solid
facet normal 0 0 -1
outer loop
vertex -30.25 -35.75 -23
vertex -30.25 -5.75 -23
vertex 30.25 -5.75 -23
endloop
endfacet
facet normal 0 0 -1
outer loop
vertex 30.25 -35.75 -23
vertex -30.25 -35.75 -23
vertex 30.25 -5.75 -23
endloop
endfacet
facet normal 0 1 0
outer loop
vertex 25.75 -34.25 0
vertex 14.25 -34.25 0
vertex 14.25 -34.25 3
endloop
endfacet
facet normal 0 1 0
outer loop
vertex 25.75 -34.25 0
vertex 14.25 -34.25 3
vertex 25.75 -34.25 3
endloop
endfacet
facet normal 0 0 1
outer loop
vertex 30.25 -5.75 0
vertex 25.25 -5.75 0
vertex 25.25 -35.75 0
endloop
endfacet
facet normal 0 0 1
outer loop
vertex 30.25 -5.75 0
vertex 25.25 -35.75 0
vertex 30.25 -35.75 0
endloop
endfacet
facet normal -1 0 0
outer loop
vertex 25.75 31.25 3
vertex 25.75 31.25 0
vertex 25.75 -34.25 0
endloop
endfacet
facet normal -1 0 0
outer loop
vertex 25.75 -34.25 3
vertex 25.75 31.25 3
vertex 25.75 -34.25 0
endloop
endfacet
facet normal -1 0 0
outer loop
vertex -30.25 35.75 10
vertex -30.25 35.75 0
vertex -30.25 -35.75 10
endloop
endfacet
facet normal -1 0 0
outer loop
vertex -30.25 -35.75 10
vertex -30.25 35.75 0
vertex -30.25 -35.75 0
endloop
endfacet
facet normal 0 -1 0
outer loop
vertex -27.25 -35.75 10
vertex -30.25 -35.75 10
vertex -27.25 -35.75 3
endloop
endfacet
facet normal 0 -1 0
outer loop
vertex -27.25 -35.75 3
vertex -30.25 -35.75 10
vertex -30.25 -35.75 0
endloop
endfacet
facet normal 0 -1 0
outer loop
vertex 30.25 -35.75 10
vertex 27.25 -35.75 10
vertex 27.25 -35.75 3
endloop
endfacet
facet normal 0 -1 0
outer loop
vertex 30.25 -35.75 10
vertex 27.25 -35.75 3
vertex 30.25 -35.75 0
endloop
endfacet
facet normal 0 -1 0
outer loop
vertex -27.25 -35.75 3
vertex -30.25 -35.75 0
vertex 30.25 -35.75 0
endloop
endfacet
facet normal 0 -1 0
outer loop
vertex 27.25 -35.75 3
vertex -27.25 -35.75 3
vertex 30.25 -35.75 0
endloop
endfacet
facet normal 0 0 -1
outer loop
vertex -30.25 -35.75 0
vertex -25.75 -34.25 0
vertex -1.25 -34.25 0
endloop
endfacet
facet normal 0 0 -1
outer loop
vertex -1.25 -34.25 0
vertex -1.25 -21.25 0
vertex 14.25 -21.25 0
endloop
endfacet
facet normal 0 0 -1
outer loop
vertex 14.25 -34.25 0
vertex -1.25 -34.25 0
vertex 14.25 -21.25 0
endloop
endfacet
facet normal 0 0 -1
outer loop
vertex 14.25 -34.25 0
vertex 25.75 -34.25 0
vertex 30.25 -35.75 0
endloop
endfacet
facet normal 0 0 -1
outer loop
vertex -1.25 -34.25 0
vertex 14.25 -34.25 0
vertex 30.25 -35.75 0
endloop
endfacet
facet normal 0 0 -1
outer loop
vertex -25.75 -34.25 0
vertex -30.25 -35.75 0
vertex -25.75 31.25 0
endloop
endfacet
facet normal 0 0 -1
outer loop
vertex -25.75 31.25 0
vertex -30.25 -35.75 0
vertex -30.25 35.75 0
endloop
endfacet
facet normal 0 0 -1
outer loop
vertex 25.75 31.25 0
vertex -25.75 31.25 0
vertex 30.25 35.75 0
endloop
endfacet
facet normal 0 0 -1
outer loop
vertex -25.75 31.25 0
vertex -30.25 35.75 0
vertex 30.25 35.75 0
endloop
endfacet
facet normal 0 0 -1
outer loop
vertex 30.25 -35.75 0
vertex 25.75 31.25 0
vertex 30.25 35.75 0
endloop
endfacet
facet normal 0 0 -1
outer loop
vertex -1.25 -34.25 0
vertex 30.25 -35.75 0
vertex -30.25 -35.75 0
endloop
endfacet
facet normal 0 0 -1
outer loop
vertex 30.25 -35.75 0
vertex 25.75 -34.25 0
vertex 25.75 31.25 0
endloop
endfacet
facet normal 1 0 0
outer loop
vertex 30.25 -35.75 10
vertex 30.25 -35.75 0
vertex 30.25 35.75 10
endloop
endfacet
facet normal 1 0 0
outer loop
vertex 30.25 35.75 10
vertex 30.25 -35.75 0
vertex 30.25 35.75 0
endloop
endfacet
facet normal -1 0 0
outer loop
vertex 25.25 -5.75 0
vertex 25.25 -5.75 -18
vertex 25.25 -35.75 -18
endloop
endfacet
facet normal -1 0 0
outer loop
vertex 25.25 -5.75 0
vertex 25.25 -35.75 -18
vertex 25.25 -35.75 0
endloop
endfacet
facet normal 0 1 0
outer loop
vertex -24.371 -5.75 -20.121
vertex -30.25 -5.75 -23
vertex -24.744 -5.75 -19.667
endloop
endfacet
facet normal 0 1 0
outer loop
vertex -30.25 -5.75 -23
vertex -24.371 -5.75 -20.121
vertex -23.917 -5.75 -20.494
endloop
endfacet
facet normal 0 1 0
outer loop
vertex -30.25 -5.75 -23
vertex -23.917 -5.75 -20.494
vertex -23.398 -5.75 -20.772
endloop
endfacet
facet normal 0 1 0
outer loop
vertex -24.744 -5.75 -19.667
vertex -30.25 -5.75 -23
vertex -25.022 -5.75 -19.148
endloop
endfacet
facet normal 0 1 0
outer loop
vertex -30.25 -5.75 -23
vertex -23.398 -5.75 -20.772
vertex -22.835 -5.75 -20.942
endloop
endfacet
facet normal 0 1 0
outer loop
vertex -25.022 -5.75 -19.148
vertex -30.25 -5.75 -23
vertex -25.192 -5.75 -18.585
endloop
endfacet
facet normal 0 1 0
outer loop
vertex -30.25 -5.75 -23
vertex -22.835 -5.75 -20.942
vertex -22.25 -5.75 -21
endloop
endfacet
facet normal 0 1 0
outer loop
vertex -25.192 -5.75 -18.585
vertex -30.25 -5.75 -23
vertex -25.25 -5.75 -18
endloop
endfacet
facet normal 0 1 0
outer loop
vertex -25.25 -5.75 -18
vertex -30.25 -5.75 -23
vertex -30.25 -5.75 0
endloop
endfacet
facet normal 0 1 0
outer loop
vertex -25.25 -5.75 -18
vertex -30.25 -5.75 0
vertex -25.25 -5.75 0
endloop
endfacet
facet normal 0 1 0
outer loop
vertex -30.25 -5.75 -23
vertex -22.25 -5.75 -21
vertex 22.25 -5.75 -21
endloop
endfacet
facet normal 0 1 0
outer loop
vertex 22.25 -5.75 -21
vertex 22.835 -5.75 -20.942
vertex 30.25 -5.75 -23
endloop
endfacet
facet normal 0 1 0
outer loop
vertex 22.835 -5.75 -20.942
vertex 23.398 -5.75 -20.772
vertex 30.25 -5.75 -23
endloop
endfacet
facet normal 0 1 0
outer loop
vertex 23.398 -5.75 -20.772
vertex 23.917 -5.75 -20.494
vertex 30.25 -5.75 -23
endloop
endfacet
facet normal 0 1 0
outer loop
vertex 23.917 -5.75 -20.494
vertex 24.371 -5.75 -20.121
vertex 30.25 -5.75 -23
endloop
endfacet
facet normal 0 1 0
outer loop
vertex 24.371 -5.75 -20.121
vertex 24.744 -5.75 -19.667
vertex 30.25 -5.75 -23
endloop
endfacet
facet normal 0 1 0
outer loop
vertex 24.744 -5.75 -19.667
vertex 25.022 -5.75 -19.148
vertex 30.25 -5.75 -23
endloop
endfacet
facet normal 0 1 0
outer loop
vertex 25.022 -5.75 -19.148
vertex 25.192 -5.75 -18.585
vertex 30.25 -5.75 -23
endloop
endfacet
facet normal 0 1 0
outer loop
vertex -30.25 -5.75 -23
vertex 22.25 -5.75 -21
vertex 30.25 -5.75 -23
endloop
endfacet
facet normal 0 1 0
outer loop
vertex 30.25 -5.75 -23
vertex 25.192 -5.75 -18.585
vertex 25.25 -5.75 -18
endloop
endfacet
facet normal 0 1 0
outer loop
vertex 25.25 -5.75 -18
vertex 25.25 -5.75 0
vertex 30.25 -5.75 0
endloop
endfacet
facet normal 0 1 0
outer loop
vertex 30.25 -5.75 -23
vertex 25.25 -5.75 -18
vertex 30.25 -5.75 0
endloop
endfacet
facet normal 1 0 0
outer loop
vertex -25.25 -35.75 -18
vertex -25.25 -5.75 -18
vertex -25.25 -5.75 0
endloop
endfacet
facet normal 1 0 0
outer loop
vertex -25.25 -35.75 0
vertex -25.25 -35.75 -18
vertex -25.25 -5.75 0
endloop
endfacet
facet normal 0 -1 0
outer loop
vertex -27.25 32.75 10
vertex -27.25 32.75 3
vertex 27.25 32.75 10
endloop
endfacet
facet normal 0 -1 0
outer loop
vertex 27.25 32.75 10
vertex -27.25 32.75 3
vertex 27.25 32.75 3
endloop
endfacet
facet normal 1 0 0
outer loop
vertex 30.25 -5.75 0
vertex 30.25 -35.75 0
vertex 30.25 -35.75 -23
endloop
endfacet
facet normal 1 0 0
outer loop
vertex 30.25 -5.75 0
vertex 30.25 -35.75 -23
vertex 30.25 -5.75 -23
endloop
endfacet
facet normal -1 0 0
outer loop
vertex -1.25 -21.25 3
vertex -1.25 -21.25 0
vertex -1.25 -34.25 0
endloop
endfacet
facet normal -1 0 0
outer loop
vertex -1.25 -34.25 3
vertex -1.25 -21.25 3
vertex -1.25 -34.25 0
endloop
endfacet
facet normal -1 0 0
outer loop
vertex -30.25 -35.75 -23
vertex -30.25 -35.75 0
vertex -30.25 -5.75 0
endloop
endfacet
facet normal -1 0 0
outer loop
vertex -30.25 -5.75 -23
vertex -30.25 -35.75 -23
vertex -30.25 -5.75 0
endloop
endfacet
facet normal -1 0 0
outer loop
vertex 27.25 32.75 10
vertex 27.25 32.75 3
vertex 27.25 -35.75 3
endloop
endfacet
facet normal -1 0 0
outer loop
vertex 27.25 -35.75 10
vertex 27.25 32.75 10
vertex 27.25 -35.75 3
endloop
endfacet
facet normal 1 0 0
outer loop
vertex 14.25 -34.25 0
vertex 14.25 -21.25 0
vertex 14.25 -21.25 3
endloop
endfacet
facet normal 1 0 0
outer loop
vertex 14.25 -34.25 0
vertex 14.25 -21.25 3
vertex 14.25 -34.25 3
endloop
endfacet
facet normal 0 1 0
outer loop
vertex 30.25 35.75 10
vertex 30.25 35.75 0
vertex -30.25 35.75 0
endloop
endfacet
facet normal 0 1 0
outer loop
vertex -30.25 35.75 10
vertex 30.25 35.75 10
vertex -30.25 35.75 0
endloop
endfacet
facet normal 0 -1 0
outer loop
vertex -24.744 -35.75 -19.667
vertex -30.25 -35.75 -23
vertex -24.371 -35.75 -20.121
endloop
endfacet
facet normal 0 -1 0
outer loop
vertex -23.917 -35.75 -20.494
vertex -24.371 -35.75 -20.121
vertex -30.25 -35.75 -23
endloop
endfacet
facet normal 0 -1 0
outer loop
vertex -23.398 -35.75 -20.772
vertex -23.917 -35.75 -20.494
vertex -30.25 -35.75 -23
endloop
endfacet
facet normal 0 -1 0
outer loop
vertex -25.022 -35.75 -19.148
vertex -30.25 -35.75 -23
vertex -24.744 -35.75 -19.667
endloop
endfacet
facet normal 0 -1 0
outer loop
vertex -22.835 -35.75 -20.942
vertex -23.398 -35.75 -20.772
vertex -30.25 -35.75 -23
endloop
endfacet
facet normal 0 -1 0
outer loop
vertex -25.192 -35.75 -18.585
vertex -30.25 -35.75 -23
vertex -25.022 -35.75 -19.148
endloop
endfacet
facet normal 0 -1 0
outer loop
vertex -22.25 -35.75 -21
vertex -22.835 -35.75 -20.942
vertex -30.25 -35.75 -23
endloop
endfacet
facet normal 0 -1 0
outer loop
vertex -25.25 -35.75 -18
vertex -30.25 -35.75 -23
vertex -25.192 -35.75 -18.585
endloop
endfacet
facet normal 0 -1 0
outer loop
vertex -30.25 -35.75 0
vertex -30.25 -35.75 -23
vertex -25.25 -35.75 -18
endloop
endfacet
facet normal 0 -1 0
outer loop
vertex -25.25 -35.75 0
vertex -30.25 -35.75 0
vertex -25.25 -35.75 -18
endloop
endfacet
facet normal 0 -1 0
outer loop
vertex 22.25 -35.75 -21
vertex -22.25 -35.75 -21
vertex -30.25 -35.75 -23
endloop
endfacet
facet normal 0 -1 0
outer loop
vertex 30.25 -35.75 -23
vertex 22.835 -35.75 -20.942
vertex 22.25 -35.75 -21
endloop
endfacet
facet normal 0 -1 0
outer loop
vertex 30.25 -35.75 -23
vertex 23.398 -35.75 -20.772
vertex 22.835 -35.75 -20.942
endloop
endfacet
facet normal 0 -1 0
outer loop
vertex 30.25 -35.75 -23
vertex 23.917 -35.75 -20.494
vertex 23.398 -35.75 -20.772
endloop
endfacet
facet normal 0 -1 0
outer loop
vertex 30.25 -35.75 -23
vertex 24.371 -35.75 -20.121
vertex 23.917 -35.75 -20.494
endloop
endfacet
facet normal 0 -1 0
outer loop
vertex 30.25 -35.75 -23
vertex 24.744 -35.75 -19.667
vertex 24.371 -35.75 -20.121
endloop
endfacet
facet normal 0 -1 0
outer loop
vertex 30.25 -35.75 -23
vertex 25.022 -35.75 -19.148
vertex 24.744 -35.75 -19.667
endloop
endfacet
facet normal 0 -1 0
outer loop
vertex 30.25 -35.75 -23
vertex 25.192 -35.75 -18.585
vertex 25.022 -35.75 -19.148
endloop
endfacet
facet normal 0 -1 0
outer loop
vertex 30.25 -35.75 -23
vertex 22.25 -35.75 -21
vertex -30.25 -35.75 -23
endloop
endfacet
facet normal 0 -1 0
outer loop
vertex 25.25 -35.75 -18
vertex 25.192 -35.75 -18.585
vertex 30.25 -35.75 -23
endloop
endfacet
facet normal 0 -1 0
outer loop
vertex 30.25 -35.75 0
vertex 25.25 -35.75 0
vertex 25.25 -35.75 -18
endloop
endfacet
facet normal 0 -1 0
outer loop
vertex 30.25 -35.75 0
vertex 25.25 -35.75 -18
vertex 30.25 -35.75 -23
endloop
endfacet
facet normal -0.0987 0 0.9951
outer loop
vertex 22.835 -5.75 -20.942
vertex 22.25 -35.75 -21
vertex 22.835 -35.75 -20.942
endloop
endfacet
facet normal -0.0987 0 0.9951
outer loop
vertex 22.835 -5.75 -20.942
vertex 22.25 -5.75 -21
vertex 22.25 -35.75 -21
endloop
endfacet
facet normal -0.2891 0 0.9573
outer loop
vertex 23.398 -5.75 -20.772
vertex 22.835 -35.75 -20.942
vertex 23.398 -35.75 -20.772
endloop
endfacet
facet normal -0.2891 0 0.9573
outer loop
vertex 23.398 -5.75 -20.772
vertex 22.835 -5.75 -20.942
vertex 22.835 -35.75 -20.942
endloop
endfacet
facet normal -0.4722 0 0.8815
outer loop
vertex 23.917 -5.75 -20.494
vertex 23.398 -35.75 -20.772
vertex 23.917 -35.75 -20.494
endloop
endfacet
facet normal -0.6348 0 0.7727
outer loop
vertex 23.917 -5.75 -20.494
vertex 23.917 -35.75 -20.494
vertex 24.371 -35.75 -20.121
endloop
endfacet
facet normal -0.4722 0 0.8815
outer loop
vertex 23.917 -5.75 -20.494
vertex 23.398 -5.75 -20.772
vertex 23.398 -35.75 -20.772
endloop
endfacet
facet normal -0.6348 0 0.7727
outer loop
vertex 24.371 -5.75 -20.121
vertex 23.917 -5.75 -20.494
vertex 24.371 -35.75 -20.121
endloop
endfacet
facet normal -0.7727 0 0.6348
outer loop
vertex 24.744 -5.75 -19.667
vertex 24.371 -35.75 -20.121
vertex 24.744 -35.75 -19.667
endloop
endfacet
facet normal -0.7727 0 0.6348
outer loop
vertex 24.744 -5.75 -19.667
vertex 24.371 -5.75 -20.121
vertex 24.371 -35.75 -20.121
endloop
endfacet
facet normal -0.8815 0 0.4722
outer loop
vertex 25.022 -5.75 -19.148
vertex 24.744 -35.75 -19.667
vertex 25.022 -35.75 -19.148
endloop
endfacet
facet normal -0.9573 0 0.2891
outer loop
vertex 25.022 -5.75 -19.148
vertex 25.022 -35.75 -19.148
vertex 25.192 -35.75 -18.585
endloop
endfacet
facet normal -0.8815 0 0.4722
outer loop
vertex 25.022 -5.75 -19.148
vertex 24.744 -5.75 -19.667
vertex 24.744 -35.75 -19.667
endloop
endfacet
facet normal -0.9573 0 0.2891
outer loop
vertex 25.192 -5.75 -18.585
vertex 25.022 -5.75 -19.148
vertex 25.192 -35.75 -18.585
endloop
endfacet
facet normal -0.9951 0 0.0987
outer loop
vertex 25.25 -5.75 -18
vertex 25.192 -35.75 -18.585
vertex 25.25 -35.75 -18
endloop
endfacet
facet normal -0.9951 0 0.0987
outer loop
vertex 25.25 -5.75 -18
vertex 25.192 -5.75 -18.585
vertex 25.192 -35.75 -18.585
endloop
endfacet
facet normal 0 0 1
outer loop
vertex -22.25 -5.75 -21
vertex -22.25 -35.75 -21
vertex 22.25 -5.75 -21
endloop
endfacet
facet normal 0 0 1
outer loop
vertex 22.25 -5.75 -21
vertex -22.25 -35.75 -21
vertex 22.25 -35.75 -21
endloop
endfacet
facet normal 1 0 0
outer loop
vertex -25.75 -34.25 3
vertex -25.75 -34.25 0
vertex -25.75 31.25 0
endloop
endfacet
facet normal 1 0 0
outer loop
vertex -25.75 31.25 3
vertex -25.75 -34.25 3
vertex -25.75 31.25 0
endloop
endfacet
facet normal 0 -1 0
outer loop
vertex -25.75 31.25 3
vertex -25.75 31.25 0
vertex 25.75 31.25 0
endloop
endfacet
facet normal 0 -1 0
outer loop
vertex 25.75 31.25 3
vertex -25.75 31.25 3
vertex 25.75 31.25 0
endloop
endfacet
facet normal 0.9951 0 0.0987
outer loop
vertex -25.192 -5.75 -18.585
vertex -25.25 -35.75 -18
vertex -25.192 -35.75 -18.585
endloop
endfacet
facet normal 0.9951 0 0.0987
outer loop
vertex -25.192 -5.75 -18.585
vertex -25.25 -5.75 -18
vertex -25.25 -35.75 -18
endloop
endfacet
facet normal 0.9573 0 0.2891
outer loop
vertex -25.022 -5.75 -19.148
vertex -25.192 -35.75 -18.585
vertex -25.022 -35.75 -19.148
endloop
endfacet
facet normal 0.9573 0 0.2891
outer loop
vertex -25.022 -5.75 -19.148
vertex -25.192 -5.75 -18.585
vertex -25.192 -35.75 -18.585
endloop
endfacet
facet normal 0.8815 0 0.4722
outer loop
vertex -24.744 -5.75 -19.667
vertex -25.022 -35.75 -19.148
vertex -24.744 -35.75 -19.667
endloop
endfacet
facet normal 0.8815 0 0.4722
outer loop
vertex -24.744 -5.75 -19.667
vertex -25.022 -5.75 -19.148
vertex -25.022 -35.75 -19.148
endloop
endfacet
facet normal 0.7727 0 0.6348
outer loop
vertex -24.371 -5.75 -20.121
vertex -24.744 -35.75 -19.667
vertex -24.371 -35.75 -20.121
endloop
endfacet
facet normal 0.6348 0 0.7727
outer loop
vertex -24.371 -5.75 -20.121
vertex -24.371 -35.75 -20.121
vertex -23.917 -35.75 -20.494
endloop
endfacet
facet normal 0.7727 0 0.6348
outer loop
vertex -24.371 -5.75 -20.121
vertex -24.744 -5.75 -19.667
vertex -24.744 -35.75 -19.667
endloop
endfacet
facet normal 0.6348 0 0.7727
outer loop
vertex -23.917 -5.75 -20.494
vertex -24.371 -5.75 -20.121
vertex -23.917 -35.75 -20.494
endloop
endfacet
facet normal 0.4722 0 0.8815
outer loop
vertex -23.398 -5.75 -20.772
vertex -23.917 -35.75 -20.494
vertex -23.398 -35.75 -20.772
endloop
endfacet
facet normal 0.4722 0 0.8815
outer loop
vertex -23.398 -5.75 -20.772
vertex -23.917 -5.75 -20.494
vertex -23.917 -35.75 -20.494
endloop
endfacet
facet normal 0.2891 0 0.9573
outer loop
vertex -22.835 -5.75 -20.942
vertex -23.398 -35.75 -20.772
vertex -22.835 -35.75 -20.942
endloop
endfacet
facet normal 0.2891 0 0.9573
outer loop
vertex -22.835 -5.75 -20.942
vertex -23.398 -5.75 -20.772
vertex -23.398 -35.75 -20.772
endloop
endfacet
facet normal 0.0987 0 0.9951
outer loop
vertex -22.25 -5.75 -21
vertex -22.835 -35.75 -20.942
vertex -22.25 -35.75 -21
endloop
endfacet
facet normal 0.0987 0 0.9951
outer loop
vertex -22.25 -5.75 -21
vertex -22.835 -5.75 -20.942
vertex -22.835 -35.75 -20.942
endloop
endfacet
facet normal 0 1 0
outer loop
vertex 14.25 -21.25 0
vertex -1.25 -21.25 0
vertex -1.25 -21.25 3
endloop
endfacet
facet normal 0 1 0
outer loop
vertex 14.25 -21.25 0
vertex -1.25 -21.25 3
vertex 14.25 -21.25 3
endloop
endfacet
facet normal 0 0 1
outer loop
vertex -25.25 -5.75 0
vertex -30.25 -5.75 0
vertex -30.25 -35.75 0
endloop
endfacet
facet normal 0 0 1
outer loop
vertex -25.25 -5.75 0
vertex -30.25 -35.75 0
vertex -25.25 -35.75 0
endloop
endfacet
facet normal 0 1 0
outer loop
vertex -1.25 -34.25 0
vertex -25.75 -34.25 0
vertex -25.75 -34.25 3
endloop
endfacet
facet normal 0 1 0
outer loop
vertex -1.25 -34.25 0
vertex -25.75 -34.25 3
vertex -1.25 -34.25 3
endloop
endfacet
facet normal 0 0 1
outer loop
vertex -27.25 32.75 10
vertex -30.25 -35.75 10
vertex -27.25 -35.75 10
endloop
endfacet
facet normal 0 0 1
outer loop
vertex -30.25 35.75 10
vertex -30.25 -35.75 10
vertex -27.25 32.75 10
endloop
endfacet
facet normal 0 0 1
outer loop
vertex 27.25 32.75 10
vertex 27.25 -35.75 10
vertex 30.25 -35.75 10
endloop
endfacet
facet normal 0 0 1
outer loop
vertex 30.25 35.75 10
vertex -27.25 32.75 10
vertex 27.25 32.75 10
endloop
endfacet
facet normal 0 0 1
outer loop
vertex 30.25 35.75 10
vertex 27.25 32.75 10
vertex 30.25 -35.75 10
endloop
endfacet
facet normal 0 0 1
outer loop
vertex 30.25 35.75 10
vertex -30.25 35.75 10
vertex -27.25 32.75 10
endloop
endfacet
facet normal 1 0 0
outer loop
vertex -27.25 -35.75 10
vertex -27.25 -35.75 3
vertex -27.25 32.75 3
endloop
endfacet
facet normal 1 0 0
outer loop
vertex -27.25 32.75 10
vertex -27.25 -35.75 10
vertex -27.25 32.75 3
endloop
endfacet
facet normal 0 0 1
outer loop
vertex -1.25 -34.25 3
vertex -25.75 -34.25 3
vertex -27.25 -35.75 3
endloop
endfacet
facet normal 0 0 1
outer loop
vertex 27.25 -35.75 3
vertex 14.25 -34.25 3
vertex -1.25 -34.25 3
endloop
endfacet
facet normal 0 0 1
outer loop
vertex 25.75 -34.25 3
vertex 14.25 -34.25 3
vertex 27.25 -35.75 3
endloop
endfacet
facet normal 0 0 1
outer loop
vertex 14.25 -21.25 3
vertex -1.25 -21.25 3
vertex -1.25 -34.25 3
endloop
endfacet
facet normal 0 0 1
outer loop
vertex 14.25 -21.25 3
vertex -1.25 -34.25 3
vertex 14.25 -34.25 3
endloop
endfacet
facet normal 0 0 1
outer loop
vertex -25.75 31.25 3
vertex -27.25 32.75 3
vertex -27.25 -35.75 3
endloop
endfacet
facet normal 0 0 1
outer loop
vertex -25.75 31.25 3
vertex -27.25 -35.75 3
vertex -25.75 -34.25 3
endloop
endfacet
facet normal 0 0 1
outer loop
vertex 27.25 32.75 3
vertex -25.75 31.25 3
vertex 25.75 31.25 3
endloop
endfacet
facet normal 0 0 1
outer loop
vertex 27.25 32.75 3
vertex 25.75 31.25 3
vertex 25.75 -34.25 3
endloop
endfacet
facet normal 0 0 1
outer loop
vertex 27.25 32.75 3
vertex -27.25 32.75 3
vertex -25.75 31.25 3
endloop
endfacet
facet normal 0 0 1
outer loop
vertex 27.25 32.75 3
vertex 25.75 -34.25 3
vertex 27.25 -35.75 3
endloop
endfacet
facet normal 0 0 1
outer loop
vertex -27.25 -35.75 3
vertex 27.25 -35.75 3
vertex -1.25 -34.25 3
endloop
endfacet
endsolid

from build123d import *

# Parameters (mm, degrees)
F1_DEPTH  = 10
F2_W      = 51.5
F2_H      = 1.5
F3_DEPTH  = 3
F4_W      = 60.5
F4_H      = 30
F5_DEPTH  = 23
F7_W      = 50.5
F7_H      = 21
F8_DEPTH  = 38.4
F9_R      = 3
F6_W      = 15.5
F6_H      = 13
F10_DEPTH = 3


with BuildPart() as f1:
    # F0 (on Top) → F1 (new body)
    with BuildSketch(Plane.XY):
        Polygon((30.25, -35.75), (30.25, 35.75), (-30.25, 35.75), (-30.25, -35.75), (-27.25, -35.75), (-27.25, 32.75), (27.25, 32.75), (27.25, -35.75), align=None)
    extrude(amount=F1_DEPTH)

    # F2 (on Top) → F3 (join)
    with BuildSketch(Plane.XY):
        Polygon((-27.25, -35.75), (-25.75, -35.75), (-25.75, -34.25), (-25.75, 31.25), (25.75, 31.25), (25.75, -34.25), (25.75, -35.75), (27.25, -35.75), (27.25, 32.75), (-27.25, 32.75), align=None)
        with Locations((0, -35)):
            Rectangle(F2_W, F2_H)
    extrude(amount=F3_DEPTH)

    # F6 (on face) → F10 (join)
    with BuildSketch(Plane(origin=(0, 0, 0), x_dir=(1, 0, 0), z_dir=(0, 0, -1))):
        with Locations((6.5, 27.75)):
            Rectangle(F6_W, F6_H)
    extrude(amount=-F10_DEPTH)


with BuildPart() as f5:
    # F4 (on Top) → F5 (new body)
    with BuildSketch(Plane.XY):
        with Locations((0, -20.75)):
            Rectangle(F4_W, F4_H)
    extrude(amount=-F5_DEPTH)

    # F7 (on face) → F8 (cut)
    with BuildSketch(Plane.XZ.offset(35.75)):
        with Locations((0, -10.5)):
            Rectangle(F7_W, F7_H)
    extrude(amount=-F8_DEPTH, mode=Mode.SUBTRACT)

    # F9
    f9_edges = [f5.edges().sort_by_distance(p)[0] for p in [
        (-25.25, -20.75, -21),
        (25.25, -20.75, -21),
    ]]
    fillet(f9_edges, radius=F9_R)


solid = Compound([f1.part, f5.part])
